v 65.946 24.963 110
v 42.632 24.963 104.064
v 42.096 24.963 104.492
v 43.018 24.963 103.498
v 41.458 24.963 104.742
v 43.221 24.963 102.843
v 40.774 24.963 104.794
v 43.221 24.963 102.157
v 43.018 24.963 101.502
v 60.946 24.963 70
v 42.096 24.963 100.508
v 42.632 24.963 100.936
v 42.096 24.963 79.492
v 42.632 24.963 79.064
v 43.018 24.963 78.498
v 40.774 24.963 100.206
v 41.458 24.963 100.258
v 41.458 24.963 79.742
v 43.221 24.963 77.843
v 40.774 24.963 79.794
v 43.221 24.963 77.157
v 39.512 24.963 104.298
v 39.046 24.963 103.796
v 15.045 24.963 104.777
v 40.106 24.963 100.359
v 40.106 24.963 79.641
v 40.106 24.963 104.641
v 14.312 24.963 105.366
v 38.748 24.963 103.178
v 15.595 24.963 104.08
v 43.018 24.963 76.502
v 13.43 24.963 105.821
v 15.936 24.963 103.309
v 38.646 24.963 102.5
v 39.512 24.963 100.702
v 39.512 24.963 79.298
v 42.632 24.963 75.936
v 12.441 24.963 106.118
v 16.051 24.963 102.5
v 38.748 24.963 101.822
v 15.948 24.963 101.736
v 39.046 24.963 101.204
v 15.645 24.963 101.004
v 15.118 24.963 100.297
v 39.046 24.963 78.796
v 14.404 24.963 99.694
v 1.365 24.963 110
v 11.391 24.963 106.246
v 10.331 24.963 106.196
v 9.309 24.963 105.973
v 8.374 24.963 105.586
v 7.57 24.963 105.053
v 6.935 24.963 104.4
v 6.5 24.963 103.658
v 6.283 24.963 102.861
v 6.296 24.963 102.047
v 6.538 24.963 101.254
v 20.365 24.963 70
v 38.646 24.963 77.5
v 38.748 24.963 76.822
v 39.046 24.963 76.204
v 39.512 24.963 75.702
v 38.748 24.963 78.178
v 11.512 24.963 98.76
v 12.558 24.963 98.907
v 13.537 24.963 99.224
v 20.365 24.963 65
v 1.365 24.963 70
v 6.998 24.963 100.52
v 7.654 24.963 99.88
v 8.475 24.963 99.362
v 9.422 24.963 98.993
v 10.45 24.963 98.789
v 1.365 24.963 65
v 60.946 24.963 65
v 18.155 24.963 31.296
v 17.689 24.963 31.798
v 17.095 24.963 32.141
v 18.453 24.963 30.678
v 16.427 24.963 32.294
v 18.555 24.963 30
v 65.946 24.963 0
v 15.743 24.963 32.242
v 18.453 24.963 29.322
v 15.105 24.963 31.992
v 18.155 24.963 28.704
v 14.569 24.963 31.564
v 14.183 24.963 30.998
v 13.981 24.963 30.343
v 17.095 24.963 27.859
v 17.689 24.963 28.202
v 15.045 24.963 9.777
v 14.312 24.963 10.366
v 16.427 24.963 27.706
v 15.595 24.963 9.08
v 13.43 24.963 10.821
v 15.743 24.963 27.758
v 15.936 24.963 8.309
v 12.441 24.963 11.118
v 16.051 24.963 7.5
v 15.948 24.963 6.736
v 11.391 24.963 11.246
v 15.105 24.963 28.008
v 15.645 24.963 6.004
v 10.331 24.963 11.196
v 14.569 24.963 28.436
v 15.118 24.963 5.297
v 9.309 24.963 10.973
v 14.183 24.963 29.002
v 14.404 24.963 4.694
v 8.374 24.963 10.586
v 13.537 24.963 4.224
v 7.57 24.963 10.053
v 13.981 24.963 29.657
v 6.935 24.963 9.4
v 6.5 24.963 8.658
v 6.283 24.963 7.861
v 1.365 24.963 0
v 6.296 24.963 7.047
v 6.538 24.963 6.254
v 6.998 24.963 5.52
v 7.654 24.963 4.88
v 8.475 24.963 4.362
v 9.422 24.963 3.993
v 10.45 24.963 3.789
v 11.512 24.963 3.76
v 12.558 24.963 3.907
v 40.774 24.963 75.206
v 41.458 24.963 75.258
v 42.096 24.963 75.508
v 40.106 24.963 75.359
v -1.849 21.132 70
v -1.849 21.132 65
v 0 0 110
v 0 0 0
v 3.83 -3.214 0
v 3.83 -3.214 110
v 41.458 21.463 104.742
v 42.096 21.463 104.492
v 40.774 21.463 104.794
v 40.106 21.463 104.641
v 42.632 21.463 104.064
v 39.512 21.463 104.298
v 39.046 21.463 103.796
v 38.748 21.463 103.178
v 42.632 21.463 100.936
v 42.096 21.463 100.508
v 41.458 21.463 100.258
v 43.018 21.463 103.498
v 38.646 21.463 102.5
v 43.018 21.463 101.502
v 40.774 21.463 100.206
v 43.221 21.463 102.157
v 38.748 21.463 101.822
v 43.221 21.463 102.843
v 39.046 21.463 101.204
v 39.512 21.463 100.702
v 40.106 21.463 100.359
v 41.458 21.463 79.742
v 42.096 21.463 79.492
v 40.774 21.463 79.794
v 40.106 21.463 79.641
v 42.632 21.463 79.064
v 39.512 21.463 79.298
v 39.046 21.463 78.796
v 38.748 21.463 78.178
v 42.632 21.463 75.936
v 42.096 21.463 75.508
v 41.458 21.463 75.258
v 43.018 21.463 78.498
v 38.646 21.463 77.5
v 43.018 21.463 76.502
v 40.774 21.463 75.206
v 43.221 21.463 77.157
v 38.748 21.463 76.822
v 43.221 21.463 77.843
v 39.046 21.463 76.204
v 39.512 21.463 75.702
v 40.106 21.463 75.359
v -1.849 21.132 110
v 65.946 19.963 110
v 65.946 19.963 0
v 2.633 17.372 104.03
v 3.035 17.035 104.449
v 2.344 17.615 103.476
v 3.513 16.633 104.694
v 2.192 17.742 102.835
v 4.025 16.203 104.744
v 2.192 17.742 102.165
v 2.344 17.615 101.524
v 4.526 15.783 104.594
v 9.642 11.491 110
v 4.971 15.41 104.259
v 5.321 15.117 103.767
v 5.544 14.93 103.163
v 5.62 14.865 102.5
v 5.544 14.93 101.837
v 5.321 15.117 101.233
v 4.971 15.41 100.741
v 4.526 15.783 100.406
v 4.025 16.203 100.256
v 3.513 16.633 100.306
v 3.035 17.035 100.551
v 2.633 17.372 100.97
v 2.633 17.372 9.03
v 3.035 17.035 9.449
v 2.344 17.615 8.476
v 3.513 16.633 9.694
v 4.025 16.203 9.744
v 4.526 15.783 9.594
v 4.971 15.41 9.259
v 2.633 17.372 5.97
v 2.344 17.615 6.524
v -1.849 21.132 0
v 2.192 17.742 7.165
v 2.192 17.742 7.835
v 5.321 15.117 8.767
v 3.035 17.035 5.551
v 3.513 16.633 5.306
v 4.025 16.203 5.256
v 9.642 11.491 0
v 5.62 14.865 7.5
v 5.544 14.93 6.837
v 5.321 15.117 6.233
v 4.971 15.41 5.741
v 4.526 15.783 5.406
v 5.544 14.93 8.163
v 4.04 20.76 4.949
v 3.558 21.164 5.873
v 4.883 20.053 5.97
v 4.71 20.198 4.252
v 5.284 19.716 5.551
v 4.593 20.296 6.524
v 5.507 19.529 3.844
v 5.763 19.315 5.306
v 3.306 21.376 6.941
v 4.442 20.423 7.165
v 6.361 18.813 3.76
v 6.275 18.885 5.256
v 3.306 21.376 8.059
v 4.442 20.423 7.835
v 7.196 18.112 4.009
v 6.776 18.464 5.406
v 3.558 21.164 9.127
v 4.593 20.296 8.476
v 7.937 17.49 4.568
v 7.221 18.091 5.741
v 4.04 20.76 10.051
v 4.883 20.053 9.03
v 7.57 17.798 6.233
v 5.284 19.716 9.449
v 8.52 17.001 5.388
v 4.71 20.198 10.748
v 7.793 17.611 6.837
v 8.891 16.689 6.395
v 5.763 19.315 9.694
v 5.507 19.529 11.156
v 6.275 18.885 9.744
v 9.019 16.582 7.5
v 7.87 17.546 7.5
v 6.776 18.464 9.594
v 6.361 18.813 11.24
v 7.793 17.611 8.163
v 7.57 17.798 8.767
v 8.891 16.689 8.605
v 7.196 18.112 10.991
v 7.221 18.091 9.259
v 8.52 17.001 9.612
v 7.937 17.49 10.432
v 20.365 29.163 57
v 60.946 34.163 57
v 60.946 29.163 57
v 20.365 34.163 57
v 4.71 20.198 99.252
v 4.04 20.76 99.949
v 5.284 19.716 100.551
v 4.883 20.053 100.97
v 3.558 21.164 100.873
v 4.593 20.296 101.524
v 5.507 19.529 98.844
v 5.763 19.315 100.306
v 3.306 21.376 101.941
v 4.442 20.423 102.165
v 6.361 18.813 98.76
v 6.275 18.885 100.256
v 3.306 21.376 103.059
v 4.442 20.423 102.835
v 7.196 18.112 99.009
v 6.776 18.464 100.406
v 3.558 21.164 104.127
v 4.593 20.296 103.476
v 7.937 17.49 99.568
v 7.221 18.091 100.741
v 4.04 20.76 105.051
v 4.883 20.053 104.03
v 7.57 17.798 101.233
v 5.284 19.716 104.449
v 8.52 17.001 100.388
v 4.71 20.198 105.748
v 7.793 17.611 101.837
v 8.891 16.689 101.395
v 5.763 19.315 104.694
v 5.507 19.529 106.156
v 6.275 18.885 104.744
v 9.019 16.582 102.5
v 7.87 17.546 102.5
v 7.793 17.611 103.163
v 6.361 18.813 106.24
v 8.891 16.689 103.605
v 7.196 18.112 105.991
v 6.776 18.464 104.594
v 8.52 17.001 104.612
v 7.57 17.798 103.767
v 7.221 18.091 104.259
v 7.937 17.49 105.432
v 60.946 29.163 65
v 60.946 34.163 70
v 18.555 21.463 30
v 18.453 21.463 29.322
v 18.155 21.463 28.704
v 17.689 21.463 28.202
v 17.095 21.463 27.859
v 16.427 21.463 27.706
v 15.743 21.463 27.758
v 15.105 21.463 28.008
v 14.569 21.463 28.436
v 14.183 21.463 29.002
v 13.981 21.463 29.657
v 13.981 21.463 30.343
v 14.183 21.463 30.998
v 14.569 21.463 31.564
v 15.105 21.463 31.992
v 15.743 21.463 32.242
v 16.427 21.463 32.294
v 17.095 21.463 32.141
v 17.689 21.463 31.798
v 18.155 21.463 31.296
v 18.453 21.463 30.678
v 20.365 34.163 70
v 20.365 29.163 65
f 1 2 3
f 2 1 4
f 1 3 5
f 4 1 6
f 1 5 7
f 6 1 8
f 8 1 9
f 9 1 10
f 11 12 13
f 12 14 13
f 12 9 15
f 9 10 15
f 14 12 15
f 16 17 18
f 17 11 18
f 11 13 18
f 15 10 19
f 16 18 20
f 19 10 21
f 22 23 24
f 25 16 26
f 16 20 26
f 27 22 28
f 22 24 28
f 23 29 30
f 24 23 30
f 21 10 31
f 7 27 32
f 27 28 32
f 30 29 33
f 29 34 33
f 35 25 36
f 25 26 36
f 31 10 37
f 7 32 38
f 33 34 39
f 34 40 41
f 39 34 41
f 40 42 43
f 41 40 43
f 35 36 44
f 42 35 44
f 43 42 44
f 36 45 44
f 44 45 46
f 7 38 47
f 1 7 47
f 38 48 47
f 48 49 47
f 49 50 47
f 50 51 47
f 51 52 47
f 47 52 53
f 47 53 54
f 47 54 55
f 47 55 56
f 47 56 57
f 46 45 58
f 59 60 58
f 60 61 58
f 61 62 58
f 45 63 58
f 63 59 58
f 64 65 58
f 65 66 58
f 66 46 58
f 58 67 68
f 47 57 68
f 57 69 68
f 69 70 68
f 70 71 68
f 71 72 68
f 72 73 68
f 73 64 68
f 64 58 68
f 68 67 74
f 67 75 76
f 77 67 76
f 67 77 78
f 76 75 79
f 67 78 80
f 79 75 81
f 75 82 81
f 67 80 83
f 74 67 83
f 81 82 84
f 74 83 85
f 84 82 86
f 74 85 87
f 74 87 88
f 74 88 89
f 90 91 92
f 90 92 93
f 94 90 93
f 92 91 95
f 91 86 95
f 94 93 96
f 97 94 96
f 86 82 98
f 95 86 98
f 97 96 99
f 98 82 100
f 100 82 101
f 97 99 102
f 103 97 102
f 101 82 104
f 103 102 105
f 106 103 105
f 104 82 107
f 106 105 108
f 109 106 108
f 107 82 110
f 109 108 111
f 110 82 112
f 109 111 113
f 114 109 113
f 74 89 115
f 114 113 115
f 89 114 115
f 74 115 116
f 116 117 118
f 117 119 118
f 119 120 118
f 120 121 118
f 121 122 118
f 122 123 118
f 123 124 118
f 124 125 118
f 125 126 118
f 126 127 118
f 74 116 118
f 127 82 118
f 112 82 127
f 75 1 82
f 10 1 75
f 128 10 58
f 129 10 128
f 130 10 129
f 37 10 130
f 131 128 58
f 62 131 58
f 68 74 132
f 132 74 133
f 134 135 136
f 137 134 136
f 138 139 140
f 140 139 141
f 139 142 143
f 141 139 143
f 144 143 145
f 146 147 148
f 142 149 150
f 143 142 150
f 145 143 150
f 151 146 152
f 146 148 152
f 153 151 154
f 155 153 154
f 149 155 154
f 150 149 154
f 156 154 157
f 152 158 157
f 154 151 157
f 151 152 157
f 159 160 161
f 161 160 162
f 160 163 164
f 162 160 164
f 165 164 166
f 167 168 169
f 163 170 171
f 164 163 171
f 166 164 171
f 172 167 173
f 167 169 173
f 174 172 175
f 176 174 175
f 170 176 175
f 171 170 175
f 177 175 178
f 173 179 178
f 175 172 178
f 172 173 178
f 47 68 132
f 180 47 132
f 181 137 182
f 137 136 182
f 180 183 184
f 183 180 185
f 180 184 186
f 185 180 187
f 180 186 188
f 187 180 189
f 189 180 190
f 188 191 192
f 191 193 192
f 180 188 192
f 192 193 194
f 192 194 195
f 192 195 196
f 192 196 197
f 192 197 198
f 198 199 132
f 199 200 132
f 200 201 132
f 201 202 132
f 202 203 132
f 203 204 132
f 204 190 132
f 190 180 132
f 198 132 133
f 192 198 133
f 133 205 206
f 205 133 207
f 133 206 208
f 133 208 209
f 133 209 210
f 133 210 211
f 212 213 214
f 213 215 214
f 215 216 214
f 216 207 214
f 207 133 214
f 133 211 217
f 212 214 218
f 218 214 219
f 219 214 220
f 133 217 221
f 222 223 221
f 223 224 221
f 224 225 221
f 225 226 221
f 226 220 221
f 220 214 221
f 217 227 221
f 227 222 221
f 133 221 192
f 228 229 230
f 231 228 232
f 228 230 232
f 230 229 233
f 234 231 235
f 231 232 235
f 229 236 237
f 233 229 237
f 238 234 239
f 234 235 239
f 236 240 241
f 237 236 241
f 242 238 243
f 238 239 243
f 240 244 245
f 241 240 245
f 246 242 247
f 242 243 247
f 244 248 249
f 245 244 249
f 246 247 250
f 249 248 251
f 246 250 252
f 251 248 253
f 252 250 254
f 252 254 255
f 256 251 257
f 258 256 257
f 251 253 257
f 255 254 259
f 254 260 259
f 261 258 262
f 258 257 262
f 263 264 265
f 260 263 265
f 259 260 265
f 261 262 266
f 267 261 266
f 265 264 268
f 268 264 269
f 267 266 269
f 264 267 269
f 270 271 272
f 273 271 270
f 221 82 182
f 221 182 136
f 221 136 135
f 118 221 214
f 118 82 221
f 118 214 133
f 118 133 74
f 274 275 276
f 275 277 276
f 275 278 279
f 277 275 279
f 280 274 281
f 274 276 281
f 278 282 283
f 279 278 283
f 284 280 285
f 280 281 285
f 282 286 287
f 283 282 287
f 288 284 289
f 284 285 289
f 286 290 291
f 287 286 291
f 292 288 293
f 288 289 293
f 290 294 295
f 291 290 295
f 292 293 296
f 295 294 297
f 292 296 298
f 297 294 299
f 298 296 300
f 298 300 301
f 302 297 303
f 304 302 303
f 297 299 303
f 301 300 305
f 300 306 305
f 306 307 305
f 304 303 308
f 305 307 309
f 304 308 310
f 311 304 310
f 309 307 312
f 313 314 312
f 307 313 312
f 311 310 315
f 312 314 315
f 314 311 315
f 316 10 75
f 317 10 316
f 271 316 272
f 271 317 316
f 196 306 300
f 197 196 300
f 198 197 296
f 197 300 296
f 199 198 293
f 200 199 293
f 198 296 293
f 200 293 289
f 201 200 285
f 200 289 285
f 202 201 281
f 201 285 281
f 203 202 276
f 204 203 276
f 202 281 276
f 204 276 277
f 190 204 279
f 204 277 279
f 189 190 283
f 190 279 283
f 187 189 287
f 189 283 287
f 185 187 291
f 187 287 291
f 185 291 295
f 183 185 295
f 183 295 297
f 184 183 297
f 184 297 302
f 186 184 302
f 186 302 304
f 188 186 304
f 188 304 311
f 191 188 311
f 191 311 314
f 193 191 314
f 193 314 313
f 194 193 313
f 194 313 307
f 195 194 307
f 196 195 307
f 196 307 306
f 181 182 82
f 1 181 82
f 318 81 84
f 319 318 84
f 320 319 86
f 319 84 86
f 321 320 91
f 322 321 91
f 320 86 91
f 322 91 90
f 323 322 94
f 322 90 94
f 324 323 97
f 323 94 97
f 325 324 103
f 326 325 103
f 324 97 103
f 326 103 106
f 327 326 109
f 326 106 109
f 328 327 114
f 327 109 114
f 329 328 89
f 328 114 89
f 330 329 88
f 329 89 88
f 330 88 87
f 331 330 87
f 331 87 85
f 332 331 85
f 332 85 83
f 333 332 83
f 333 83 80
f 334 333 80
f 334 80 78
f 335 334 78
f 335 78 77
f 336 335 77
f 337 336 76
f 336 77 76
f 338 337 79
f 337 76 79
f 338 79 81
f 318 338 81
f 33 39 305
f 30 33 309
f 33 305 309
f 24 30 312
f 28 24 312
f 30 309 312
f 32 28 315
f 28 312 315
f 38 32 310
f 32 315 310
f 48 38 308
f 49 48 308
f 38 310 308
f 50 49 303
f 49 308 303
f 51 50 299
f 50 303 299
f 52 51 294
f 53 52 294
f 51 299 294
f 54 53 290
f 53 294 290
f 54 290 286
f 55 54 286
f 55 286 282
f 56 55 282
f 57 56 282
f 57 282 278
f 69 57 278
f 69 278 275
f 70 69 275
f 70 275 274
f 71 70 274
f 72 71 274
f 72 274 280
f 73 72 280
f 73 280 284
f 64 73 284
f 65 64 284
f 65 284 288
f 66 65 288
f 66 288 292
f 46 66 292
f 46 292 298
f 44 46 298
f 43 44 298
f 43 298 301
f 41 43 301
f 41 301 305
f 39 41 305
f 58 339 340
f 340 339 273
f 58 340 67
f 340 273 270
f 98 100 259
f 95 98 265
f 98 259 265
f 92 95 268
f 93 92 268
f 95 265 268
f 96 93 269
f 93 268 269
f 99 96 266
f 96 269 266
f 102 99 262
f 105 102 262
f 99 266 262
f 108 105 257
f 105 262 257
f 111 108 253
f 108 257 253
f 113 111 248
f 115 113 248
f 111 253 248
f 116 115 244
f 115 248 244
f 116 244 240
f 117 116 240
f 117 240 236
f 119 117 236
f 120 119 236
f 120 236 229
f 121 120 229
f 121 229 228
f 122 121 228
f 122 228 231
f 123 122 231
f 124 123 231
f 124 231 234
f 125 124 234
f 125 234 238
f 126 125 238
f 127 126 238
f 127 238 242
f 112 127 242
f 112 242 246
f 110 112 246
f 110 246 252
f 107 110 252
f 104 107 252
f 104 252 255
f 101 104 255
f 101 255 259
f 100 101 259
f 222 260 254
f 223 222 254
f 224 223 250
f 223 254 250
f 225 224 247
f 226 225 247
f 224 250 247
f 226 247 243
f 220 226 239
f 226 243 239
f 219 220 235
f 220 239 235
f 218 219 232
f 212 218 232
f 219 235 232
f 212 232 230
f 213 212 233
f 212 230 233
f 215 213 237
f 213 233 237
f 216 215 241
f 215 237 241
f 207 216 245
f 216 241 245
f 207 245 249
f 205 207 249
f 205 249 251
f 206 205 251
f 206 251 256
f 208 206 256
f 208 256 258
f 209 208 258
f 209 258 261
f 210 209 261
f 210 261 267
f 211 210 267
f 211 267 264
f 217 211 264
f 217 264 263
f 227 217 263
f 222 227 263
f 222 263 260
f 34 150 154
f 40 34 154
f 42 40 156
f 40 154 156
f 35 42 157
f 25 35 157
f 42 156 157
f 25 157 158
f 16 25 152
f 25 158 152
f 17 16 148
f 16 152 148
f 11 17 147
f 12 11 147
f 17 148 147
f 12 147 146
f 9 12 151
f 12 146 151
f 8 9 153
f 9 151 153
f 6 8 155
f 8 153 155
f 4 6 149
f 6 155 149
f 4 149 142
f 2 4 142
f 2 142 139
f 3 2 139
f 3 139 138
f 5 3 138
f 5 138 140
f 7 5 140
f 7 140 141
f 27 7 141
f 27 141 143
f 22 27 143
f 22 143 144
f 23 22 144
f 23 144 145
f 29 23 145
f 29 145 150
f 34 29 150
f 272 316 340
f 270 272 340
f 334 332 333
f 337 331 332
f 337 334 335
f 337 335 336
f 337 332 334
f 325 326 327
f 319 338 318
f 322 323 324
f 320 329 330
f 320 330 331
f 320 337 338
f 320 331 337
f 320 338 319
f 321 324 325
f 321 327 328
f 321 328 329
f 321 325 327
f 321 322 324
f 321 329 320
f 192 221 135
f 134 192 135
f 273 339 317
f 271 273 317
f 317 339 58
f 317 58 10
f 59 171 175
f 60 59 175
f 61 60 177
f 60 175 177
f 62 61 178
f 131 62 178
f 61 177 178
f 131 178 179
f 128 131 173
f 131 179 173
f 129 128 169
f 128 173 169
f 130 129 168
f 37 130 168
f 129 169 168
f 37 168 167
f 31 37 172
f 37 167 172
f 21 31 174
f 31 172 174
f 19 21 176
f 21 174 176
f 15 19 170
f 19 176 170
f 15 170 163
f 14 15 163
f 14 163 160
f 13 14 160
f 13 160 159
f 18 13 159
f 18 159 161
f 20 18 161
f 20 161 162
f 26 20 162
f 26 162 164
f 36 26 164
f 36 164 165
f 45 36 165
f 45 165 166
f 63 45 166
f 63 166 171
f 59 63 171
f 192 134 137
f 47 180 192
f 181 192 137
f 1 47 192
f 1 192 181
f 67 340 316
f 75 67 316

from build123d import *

# Parameters (mm, degrees)
EXTRUDE_1_DEPTH     = 65
EXTRUDE_2_DEPTH     = 5
EXTRUDE_4_DEPTH     = 8
SKETCH_9_R          = 2.3
CUT_EXTRUDE_4_DEPTH = 3.5
CUT_EXTRUDE_6_DEPTH = 14
EXTRUDE_5_DEPTH     = 40
HOLE_WIZARD_M4_1_D  = 4.5
CUT_EXTRUDE_START   = -3.5
SKETCH_17_R         = 3.75
CUT_EXTRUDE_7_DEPTH = 51.05954578
F_4_0MM_1_D         = 4.6
F_4_0MM_1_DEPTH     = 3.5
CUT_EXTRUDE_8_DEPTH = 5


with BuildPart() as part:
    # ｽｹｯﾁ1 → ﾎﾞｽ - 押し出し1 (new body)
    with BuildSketch(Plane.XY):
        Polygon((0, 0), (9.641814145, 11.490666647), (-1.848852501, 21.132480792), (1.365085547, 24.962703008), (65.946194887, 24.962703008), (65.946194887, 19.962703008), (3.830222216, -3.213938048), align=None)
    extrude(amount=EXTRUDE_1_DEPTH)

    # ｽｹｯﾁ6 → ﾎﾞｽ - 押し出し2 (add)
    with BuildSketch(Plane.XY.offset(65)):
        Polygon((0, 0), (3.830222216, -3.213938048), (65.946194887, 19.962703008), (65.946194887, 34.162703008), (9.084802154, 34.162703008), (-1.848852501, 21.132480792), (9.641814145, 11.490666647), align=None)
    extrude(amount=EXTRUDE_2_DEPTH)

    # ｽｹｯﾁ8 → ﾎﾞｽ - 押し出し4 (add)
    with BuildSketch(Plane(origin=(0, 0, 65), x_dir=(-1, 0, 0), z_dir=(0, 0, -1))):
        Polygon((-65.946194887, 34.162703008), (-65.946194887, 29.162703008), (-4.889303998, 29.162703008), (-9.084802154, 34.162703008), align=None)
    extrude(amount=EXTRUDE_4_DEPTH)

    # ｽｹｯﾁ9 → ｶｯﾄ - 押し出し4 (cut)
    with BuildSketch(Plane(origin=(0, 24.962703008, 0), x_dir=(1, 0, 0), z_dir=(0, 1, 0))):
        with Locations((16.255085547, -30)):
            Circle(SKETCH_9_R)
    extrude(amount=-CUT_EXTRUDE_4_DEPTH, mode=Mode.SUBTRACT)

    # ｽｹｯﾁ11 → ｶｯﾄ - 押し出し6 (cut, through all)
    with BuildSketch(Plane(origin=(0, 0, 57), x_dir=(-1, 0, 0), z_dir=(0, 0, -1))):
        Polygon((-1.365085547, 24.962703008), (-9.084802154, 34.162703008), (-20.364802154, 34.162703008), (-20.364802154, 24.962703008), align=None)
    extrude(amount=-CUT_EXTRUDE_6_DEPTH, mode=Mode.SUBTRACT)

    # ｽｹｯﾁ12 → ﾎﾞｽ - 押し出し5 (add)
    with BuildSketch(Plane.XY.offset(70)):
        Polygon((0, 0), (3.830222216, -3.213938048), (65.946194887, 19.962703008), (65.946194887, 24.962703008), (1.365085547, 24.962703008), (-1.848852501, 21.132480792), (9.641814145, 11.490666647), align=None)
    extrude(amount=EXTRUDE_5_DEPTH)

    # M4 すきま穴1 (through all)
    with Locations(Plane(origin=(9.641814145, 11.490666647, 0), x_dir=(-0.766044443, 0.64278761, 0), z_dir=(-0.64278761, -0.766044443, 0))):
        with Locations((7.5, -102.5), (7.5, -7.5)):
            Hole(HOLE_WIZARD_M4_1_D / 2)

    # ｽｹｯﾁ17 → ｶｯﾄ - 押し出し7 (cut, through all)
    with BuildSketch(Plane(origin=(9.641814145, 11.490666647, 0), x_dir=(0.766044443, -0.64278761, 0), z_dir=(-0.64278761, -0.766044443, 0)).offset(CUT_EXTRUDE_START)):
        with Locations((-7.5, 102.5)):
            Circle(SKETCH_17_R)
        with Locations((-7.5, 7.5)):
            Circle(SKETCH_17_R)
    extrude(amount=-CUT_EXTRUDE_7_DEPTH, mode=Mode.SUBTRACT)

    # Ø4.0mm ﾀﾞｳｴﾙ穴1
    with Locations(Plane(origin=(0, 24.962703008, 0), x_dir=(1, 0, 0), z_dir=(0, 1, 0))):
        with Locations((40.946194887, -77.5), (40.946194887, -102.5)):
            Hole(F_4_0MM_1_D / 2, depth=F_4_0MM_1_DEPTH)

    # ｽｹｯﾁ20 → ｶｯﾄ - 押し出し8 (cut)
    with BuildSketch(Plane(origin=(65.946194887, 0, 0), x_dir=(0, 0, -1), z_dir=(1, 0, 0))):
        Polygon((-70, 24.962703008), (-65, 24.962703008), (-65, 29.162703008), (-57, 29.162703008), (-57, 34.162703008), (-70, 34.162703008), align=None)
    extrude(amount=-CUT_EXTRUDE_8_DEPTH, mode=Mode.SUBTRACT)


solid = part.part
